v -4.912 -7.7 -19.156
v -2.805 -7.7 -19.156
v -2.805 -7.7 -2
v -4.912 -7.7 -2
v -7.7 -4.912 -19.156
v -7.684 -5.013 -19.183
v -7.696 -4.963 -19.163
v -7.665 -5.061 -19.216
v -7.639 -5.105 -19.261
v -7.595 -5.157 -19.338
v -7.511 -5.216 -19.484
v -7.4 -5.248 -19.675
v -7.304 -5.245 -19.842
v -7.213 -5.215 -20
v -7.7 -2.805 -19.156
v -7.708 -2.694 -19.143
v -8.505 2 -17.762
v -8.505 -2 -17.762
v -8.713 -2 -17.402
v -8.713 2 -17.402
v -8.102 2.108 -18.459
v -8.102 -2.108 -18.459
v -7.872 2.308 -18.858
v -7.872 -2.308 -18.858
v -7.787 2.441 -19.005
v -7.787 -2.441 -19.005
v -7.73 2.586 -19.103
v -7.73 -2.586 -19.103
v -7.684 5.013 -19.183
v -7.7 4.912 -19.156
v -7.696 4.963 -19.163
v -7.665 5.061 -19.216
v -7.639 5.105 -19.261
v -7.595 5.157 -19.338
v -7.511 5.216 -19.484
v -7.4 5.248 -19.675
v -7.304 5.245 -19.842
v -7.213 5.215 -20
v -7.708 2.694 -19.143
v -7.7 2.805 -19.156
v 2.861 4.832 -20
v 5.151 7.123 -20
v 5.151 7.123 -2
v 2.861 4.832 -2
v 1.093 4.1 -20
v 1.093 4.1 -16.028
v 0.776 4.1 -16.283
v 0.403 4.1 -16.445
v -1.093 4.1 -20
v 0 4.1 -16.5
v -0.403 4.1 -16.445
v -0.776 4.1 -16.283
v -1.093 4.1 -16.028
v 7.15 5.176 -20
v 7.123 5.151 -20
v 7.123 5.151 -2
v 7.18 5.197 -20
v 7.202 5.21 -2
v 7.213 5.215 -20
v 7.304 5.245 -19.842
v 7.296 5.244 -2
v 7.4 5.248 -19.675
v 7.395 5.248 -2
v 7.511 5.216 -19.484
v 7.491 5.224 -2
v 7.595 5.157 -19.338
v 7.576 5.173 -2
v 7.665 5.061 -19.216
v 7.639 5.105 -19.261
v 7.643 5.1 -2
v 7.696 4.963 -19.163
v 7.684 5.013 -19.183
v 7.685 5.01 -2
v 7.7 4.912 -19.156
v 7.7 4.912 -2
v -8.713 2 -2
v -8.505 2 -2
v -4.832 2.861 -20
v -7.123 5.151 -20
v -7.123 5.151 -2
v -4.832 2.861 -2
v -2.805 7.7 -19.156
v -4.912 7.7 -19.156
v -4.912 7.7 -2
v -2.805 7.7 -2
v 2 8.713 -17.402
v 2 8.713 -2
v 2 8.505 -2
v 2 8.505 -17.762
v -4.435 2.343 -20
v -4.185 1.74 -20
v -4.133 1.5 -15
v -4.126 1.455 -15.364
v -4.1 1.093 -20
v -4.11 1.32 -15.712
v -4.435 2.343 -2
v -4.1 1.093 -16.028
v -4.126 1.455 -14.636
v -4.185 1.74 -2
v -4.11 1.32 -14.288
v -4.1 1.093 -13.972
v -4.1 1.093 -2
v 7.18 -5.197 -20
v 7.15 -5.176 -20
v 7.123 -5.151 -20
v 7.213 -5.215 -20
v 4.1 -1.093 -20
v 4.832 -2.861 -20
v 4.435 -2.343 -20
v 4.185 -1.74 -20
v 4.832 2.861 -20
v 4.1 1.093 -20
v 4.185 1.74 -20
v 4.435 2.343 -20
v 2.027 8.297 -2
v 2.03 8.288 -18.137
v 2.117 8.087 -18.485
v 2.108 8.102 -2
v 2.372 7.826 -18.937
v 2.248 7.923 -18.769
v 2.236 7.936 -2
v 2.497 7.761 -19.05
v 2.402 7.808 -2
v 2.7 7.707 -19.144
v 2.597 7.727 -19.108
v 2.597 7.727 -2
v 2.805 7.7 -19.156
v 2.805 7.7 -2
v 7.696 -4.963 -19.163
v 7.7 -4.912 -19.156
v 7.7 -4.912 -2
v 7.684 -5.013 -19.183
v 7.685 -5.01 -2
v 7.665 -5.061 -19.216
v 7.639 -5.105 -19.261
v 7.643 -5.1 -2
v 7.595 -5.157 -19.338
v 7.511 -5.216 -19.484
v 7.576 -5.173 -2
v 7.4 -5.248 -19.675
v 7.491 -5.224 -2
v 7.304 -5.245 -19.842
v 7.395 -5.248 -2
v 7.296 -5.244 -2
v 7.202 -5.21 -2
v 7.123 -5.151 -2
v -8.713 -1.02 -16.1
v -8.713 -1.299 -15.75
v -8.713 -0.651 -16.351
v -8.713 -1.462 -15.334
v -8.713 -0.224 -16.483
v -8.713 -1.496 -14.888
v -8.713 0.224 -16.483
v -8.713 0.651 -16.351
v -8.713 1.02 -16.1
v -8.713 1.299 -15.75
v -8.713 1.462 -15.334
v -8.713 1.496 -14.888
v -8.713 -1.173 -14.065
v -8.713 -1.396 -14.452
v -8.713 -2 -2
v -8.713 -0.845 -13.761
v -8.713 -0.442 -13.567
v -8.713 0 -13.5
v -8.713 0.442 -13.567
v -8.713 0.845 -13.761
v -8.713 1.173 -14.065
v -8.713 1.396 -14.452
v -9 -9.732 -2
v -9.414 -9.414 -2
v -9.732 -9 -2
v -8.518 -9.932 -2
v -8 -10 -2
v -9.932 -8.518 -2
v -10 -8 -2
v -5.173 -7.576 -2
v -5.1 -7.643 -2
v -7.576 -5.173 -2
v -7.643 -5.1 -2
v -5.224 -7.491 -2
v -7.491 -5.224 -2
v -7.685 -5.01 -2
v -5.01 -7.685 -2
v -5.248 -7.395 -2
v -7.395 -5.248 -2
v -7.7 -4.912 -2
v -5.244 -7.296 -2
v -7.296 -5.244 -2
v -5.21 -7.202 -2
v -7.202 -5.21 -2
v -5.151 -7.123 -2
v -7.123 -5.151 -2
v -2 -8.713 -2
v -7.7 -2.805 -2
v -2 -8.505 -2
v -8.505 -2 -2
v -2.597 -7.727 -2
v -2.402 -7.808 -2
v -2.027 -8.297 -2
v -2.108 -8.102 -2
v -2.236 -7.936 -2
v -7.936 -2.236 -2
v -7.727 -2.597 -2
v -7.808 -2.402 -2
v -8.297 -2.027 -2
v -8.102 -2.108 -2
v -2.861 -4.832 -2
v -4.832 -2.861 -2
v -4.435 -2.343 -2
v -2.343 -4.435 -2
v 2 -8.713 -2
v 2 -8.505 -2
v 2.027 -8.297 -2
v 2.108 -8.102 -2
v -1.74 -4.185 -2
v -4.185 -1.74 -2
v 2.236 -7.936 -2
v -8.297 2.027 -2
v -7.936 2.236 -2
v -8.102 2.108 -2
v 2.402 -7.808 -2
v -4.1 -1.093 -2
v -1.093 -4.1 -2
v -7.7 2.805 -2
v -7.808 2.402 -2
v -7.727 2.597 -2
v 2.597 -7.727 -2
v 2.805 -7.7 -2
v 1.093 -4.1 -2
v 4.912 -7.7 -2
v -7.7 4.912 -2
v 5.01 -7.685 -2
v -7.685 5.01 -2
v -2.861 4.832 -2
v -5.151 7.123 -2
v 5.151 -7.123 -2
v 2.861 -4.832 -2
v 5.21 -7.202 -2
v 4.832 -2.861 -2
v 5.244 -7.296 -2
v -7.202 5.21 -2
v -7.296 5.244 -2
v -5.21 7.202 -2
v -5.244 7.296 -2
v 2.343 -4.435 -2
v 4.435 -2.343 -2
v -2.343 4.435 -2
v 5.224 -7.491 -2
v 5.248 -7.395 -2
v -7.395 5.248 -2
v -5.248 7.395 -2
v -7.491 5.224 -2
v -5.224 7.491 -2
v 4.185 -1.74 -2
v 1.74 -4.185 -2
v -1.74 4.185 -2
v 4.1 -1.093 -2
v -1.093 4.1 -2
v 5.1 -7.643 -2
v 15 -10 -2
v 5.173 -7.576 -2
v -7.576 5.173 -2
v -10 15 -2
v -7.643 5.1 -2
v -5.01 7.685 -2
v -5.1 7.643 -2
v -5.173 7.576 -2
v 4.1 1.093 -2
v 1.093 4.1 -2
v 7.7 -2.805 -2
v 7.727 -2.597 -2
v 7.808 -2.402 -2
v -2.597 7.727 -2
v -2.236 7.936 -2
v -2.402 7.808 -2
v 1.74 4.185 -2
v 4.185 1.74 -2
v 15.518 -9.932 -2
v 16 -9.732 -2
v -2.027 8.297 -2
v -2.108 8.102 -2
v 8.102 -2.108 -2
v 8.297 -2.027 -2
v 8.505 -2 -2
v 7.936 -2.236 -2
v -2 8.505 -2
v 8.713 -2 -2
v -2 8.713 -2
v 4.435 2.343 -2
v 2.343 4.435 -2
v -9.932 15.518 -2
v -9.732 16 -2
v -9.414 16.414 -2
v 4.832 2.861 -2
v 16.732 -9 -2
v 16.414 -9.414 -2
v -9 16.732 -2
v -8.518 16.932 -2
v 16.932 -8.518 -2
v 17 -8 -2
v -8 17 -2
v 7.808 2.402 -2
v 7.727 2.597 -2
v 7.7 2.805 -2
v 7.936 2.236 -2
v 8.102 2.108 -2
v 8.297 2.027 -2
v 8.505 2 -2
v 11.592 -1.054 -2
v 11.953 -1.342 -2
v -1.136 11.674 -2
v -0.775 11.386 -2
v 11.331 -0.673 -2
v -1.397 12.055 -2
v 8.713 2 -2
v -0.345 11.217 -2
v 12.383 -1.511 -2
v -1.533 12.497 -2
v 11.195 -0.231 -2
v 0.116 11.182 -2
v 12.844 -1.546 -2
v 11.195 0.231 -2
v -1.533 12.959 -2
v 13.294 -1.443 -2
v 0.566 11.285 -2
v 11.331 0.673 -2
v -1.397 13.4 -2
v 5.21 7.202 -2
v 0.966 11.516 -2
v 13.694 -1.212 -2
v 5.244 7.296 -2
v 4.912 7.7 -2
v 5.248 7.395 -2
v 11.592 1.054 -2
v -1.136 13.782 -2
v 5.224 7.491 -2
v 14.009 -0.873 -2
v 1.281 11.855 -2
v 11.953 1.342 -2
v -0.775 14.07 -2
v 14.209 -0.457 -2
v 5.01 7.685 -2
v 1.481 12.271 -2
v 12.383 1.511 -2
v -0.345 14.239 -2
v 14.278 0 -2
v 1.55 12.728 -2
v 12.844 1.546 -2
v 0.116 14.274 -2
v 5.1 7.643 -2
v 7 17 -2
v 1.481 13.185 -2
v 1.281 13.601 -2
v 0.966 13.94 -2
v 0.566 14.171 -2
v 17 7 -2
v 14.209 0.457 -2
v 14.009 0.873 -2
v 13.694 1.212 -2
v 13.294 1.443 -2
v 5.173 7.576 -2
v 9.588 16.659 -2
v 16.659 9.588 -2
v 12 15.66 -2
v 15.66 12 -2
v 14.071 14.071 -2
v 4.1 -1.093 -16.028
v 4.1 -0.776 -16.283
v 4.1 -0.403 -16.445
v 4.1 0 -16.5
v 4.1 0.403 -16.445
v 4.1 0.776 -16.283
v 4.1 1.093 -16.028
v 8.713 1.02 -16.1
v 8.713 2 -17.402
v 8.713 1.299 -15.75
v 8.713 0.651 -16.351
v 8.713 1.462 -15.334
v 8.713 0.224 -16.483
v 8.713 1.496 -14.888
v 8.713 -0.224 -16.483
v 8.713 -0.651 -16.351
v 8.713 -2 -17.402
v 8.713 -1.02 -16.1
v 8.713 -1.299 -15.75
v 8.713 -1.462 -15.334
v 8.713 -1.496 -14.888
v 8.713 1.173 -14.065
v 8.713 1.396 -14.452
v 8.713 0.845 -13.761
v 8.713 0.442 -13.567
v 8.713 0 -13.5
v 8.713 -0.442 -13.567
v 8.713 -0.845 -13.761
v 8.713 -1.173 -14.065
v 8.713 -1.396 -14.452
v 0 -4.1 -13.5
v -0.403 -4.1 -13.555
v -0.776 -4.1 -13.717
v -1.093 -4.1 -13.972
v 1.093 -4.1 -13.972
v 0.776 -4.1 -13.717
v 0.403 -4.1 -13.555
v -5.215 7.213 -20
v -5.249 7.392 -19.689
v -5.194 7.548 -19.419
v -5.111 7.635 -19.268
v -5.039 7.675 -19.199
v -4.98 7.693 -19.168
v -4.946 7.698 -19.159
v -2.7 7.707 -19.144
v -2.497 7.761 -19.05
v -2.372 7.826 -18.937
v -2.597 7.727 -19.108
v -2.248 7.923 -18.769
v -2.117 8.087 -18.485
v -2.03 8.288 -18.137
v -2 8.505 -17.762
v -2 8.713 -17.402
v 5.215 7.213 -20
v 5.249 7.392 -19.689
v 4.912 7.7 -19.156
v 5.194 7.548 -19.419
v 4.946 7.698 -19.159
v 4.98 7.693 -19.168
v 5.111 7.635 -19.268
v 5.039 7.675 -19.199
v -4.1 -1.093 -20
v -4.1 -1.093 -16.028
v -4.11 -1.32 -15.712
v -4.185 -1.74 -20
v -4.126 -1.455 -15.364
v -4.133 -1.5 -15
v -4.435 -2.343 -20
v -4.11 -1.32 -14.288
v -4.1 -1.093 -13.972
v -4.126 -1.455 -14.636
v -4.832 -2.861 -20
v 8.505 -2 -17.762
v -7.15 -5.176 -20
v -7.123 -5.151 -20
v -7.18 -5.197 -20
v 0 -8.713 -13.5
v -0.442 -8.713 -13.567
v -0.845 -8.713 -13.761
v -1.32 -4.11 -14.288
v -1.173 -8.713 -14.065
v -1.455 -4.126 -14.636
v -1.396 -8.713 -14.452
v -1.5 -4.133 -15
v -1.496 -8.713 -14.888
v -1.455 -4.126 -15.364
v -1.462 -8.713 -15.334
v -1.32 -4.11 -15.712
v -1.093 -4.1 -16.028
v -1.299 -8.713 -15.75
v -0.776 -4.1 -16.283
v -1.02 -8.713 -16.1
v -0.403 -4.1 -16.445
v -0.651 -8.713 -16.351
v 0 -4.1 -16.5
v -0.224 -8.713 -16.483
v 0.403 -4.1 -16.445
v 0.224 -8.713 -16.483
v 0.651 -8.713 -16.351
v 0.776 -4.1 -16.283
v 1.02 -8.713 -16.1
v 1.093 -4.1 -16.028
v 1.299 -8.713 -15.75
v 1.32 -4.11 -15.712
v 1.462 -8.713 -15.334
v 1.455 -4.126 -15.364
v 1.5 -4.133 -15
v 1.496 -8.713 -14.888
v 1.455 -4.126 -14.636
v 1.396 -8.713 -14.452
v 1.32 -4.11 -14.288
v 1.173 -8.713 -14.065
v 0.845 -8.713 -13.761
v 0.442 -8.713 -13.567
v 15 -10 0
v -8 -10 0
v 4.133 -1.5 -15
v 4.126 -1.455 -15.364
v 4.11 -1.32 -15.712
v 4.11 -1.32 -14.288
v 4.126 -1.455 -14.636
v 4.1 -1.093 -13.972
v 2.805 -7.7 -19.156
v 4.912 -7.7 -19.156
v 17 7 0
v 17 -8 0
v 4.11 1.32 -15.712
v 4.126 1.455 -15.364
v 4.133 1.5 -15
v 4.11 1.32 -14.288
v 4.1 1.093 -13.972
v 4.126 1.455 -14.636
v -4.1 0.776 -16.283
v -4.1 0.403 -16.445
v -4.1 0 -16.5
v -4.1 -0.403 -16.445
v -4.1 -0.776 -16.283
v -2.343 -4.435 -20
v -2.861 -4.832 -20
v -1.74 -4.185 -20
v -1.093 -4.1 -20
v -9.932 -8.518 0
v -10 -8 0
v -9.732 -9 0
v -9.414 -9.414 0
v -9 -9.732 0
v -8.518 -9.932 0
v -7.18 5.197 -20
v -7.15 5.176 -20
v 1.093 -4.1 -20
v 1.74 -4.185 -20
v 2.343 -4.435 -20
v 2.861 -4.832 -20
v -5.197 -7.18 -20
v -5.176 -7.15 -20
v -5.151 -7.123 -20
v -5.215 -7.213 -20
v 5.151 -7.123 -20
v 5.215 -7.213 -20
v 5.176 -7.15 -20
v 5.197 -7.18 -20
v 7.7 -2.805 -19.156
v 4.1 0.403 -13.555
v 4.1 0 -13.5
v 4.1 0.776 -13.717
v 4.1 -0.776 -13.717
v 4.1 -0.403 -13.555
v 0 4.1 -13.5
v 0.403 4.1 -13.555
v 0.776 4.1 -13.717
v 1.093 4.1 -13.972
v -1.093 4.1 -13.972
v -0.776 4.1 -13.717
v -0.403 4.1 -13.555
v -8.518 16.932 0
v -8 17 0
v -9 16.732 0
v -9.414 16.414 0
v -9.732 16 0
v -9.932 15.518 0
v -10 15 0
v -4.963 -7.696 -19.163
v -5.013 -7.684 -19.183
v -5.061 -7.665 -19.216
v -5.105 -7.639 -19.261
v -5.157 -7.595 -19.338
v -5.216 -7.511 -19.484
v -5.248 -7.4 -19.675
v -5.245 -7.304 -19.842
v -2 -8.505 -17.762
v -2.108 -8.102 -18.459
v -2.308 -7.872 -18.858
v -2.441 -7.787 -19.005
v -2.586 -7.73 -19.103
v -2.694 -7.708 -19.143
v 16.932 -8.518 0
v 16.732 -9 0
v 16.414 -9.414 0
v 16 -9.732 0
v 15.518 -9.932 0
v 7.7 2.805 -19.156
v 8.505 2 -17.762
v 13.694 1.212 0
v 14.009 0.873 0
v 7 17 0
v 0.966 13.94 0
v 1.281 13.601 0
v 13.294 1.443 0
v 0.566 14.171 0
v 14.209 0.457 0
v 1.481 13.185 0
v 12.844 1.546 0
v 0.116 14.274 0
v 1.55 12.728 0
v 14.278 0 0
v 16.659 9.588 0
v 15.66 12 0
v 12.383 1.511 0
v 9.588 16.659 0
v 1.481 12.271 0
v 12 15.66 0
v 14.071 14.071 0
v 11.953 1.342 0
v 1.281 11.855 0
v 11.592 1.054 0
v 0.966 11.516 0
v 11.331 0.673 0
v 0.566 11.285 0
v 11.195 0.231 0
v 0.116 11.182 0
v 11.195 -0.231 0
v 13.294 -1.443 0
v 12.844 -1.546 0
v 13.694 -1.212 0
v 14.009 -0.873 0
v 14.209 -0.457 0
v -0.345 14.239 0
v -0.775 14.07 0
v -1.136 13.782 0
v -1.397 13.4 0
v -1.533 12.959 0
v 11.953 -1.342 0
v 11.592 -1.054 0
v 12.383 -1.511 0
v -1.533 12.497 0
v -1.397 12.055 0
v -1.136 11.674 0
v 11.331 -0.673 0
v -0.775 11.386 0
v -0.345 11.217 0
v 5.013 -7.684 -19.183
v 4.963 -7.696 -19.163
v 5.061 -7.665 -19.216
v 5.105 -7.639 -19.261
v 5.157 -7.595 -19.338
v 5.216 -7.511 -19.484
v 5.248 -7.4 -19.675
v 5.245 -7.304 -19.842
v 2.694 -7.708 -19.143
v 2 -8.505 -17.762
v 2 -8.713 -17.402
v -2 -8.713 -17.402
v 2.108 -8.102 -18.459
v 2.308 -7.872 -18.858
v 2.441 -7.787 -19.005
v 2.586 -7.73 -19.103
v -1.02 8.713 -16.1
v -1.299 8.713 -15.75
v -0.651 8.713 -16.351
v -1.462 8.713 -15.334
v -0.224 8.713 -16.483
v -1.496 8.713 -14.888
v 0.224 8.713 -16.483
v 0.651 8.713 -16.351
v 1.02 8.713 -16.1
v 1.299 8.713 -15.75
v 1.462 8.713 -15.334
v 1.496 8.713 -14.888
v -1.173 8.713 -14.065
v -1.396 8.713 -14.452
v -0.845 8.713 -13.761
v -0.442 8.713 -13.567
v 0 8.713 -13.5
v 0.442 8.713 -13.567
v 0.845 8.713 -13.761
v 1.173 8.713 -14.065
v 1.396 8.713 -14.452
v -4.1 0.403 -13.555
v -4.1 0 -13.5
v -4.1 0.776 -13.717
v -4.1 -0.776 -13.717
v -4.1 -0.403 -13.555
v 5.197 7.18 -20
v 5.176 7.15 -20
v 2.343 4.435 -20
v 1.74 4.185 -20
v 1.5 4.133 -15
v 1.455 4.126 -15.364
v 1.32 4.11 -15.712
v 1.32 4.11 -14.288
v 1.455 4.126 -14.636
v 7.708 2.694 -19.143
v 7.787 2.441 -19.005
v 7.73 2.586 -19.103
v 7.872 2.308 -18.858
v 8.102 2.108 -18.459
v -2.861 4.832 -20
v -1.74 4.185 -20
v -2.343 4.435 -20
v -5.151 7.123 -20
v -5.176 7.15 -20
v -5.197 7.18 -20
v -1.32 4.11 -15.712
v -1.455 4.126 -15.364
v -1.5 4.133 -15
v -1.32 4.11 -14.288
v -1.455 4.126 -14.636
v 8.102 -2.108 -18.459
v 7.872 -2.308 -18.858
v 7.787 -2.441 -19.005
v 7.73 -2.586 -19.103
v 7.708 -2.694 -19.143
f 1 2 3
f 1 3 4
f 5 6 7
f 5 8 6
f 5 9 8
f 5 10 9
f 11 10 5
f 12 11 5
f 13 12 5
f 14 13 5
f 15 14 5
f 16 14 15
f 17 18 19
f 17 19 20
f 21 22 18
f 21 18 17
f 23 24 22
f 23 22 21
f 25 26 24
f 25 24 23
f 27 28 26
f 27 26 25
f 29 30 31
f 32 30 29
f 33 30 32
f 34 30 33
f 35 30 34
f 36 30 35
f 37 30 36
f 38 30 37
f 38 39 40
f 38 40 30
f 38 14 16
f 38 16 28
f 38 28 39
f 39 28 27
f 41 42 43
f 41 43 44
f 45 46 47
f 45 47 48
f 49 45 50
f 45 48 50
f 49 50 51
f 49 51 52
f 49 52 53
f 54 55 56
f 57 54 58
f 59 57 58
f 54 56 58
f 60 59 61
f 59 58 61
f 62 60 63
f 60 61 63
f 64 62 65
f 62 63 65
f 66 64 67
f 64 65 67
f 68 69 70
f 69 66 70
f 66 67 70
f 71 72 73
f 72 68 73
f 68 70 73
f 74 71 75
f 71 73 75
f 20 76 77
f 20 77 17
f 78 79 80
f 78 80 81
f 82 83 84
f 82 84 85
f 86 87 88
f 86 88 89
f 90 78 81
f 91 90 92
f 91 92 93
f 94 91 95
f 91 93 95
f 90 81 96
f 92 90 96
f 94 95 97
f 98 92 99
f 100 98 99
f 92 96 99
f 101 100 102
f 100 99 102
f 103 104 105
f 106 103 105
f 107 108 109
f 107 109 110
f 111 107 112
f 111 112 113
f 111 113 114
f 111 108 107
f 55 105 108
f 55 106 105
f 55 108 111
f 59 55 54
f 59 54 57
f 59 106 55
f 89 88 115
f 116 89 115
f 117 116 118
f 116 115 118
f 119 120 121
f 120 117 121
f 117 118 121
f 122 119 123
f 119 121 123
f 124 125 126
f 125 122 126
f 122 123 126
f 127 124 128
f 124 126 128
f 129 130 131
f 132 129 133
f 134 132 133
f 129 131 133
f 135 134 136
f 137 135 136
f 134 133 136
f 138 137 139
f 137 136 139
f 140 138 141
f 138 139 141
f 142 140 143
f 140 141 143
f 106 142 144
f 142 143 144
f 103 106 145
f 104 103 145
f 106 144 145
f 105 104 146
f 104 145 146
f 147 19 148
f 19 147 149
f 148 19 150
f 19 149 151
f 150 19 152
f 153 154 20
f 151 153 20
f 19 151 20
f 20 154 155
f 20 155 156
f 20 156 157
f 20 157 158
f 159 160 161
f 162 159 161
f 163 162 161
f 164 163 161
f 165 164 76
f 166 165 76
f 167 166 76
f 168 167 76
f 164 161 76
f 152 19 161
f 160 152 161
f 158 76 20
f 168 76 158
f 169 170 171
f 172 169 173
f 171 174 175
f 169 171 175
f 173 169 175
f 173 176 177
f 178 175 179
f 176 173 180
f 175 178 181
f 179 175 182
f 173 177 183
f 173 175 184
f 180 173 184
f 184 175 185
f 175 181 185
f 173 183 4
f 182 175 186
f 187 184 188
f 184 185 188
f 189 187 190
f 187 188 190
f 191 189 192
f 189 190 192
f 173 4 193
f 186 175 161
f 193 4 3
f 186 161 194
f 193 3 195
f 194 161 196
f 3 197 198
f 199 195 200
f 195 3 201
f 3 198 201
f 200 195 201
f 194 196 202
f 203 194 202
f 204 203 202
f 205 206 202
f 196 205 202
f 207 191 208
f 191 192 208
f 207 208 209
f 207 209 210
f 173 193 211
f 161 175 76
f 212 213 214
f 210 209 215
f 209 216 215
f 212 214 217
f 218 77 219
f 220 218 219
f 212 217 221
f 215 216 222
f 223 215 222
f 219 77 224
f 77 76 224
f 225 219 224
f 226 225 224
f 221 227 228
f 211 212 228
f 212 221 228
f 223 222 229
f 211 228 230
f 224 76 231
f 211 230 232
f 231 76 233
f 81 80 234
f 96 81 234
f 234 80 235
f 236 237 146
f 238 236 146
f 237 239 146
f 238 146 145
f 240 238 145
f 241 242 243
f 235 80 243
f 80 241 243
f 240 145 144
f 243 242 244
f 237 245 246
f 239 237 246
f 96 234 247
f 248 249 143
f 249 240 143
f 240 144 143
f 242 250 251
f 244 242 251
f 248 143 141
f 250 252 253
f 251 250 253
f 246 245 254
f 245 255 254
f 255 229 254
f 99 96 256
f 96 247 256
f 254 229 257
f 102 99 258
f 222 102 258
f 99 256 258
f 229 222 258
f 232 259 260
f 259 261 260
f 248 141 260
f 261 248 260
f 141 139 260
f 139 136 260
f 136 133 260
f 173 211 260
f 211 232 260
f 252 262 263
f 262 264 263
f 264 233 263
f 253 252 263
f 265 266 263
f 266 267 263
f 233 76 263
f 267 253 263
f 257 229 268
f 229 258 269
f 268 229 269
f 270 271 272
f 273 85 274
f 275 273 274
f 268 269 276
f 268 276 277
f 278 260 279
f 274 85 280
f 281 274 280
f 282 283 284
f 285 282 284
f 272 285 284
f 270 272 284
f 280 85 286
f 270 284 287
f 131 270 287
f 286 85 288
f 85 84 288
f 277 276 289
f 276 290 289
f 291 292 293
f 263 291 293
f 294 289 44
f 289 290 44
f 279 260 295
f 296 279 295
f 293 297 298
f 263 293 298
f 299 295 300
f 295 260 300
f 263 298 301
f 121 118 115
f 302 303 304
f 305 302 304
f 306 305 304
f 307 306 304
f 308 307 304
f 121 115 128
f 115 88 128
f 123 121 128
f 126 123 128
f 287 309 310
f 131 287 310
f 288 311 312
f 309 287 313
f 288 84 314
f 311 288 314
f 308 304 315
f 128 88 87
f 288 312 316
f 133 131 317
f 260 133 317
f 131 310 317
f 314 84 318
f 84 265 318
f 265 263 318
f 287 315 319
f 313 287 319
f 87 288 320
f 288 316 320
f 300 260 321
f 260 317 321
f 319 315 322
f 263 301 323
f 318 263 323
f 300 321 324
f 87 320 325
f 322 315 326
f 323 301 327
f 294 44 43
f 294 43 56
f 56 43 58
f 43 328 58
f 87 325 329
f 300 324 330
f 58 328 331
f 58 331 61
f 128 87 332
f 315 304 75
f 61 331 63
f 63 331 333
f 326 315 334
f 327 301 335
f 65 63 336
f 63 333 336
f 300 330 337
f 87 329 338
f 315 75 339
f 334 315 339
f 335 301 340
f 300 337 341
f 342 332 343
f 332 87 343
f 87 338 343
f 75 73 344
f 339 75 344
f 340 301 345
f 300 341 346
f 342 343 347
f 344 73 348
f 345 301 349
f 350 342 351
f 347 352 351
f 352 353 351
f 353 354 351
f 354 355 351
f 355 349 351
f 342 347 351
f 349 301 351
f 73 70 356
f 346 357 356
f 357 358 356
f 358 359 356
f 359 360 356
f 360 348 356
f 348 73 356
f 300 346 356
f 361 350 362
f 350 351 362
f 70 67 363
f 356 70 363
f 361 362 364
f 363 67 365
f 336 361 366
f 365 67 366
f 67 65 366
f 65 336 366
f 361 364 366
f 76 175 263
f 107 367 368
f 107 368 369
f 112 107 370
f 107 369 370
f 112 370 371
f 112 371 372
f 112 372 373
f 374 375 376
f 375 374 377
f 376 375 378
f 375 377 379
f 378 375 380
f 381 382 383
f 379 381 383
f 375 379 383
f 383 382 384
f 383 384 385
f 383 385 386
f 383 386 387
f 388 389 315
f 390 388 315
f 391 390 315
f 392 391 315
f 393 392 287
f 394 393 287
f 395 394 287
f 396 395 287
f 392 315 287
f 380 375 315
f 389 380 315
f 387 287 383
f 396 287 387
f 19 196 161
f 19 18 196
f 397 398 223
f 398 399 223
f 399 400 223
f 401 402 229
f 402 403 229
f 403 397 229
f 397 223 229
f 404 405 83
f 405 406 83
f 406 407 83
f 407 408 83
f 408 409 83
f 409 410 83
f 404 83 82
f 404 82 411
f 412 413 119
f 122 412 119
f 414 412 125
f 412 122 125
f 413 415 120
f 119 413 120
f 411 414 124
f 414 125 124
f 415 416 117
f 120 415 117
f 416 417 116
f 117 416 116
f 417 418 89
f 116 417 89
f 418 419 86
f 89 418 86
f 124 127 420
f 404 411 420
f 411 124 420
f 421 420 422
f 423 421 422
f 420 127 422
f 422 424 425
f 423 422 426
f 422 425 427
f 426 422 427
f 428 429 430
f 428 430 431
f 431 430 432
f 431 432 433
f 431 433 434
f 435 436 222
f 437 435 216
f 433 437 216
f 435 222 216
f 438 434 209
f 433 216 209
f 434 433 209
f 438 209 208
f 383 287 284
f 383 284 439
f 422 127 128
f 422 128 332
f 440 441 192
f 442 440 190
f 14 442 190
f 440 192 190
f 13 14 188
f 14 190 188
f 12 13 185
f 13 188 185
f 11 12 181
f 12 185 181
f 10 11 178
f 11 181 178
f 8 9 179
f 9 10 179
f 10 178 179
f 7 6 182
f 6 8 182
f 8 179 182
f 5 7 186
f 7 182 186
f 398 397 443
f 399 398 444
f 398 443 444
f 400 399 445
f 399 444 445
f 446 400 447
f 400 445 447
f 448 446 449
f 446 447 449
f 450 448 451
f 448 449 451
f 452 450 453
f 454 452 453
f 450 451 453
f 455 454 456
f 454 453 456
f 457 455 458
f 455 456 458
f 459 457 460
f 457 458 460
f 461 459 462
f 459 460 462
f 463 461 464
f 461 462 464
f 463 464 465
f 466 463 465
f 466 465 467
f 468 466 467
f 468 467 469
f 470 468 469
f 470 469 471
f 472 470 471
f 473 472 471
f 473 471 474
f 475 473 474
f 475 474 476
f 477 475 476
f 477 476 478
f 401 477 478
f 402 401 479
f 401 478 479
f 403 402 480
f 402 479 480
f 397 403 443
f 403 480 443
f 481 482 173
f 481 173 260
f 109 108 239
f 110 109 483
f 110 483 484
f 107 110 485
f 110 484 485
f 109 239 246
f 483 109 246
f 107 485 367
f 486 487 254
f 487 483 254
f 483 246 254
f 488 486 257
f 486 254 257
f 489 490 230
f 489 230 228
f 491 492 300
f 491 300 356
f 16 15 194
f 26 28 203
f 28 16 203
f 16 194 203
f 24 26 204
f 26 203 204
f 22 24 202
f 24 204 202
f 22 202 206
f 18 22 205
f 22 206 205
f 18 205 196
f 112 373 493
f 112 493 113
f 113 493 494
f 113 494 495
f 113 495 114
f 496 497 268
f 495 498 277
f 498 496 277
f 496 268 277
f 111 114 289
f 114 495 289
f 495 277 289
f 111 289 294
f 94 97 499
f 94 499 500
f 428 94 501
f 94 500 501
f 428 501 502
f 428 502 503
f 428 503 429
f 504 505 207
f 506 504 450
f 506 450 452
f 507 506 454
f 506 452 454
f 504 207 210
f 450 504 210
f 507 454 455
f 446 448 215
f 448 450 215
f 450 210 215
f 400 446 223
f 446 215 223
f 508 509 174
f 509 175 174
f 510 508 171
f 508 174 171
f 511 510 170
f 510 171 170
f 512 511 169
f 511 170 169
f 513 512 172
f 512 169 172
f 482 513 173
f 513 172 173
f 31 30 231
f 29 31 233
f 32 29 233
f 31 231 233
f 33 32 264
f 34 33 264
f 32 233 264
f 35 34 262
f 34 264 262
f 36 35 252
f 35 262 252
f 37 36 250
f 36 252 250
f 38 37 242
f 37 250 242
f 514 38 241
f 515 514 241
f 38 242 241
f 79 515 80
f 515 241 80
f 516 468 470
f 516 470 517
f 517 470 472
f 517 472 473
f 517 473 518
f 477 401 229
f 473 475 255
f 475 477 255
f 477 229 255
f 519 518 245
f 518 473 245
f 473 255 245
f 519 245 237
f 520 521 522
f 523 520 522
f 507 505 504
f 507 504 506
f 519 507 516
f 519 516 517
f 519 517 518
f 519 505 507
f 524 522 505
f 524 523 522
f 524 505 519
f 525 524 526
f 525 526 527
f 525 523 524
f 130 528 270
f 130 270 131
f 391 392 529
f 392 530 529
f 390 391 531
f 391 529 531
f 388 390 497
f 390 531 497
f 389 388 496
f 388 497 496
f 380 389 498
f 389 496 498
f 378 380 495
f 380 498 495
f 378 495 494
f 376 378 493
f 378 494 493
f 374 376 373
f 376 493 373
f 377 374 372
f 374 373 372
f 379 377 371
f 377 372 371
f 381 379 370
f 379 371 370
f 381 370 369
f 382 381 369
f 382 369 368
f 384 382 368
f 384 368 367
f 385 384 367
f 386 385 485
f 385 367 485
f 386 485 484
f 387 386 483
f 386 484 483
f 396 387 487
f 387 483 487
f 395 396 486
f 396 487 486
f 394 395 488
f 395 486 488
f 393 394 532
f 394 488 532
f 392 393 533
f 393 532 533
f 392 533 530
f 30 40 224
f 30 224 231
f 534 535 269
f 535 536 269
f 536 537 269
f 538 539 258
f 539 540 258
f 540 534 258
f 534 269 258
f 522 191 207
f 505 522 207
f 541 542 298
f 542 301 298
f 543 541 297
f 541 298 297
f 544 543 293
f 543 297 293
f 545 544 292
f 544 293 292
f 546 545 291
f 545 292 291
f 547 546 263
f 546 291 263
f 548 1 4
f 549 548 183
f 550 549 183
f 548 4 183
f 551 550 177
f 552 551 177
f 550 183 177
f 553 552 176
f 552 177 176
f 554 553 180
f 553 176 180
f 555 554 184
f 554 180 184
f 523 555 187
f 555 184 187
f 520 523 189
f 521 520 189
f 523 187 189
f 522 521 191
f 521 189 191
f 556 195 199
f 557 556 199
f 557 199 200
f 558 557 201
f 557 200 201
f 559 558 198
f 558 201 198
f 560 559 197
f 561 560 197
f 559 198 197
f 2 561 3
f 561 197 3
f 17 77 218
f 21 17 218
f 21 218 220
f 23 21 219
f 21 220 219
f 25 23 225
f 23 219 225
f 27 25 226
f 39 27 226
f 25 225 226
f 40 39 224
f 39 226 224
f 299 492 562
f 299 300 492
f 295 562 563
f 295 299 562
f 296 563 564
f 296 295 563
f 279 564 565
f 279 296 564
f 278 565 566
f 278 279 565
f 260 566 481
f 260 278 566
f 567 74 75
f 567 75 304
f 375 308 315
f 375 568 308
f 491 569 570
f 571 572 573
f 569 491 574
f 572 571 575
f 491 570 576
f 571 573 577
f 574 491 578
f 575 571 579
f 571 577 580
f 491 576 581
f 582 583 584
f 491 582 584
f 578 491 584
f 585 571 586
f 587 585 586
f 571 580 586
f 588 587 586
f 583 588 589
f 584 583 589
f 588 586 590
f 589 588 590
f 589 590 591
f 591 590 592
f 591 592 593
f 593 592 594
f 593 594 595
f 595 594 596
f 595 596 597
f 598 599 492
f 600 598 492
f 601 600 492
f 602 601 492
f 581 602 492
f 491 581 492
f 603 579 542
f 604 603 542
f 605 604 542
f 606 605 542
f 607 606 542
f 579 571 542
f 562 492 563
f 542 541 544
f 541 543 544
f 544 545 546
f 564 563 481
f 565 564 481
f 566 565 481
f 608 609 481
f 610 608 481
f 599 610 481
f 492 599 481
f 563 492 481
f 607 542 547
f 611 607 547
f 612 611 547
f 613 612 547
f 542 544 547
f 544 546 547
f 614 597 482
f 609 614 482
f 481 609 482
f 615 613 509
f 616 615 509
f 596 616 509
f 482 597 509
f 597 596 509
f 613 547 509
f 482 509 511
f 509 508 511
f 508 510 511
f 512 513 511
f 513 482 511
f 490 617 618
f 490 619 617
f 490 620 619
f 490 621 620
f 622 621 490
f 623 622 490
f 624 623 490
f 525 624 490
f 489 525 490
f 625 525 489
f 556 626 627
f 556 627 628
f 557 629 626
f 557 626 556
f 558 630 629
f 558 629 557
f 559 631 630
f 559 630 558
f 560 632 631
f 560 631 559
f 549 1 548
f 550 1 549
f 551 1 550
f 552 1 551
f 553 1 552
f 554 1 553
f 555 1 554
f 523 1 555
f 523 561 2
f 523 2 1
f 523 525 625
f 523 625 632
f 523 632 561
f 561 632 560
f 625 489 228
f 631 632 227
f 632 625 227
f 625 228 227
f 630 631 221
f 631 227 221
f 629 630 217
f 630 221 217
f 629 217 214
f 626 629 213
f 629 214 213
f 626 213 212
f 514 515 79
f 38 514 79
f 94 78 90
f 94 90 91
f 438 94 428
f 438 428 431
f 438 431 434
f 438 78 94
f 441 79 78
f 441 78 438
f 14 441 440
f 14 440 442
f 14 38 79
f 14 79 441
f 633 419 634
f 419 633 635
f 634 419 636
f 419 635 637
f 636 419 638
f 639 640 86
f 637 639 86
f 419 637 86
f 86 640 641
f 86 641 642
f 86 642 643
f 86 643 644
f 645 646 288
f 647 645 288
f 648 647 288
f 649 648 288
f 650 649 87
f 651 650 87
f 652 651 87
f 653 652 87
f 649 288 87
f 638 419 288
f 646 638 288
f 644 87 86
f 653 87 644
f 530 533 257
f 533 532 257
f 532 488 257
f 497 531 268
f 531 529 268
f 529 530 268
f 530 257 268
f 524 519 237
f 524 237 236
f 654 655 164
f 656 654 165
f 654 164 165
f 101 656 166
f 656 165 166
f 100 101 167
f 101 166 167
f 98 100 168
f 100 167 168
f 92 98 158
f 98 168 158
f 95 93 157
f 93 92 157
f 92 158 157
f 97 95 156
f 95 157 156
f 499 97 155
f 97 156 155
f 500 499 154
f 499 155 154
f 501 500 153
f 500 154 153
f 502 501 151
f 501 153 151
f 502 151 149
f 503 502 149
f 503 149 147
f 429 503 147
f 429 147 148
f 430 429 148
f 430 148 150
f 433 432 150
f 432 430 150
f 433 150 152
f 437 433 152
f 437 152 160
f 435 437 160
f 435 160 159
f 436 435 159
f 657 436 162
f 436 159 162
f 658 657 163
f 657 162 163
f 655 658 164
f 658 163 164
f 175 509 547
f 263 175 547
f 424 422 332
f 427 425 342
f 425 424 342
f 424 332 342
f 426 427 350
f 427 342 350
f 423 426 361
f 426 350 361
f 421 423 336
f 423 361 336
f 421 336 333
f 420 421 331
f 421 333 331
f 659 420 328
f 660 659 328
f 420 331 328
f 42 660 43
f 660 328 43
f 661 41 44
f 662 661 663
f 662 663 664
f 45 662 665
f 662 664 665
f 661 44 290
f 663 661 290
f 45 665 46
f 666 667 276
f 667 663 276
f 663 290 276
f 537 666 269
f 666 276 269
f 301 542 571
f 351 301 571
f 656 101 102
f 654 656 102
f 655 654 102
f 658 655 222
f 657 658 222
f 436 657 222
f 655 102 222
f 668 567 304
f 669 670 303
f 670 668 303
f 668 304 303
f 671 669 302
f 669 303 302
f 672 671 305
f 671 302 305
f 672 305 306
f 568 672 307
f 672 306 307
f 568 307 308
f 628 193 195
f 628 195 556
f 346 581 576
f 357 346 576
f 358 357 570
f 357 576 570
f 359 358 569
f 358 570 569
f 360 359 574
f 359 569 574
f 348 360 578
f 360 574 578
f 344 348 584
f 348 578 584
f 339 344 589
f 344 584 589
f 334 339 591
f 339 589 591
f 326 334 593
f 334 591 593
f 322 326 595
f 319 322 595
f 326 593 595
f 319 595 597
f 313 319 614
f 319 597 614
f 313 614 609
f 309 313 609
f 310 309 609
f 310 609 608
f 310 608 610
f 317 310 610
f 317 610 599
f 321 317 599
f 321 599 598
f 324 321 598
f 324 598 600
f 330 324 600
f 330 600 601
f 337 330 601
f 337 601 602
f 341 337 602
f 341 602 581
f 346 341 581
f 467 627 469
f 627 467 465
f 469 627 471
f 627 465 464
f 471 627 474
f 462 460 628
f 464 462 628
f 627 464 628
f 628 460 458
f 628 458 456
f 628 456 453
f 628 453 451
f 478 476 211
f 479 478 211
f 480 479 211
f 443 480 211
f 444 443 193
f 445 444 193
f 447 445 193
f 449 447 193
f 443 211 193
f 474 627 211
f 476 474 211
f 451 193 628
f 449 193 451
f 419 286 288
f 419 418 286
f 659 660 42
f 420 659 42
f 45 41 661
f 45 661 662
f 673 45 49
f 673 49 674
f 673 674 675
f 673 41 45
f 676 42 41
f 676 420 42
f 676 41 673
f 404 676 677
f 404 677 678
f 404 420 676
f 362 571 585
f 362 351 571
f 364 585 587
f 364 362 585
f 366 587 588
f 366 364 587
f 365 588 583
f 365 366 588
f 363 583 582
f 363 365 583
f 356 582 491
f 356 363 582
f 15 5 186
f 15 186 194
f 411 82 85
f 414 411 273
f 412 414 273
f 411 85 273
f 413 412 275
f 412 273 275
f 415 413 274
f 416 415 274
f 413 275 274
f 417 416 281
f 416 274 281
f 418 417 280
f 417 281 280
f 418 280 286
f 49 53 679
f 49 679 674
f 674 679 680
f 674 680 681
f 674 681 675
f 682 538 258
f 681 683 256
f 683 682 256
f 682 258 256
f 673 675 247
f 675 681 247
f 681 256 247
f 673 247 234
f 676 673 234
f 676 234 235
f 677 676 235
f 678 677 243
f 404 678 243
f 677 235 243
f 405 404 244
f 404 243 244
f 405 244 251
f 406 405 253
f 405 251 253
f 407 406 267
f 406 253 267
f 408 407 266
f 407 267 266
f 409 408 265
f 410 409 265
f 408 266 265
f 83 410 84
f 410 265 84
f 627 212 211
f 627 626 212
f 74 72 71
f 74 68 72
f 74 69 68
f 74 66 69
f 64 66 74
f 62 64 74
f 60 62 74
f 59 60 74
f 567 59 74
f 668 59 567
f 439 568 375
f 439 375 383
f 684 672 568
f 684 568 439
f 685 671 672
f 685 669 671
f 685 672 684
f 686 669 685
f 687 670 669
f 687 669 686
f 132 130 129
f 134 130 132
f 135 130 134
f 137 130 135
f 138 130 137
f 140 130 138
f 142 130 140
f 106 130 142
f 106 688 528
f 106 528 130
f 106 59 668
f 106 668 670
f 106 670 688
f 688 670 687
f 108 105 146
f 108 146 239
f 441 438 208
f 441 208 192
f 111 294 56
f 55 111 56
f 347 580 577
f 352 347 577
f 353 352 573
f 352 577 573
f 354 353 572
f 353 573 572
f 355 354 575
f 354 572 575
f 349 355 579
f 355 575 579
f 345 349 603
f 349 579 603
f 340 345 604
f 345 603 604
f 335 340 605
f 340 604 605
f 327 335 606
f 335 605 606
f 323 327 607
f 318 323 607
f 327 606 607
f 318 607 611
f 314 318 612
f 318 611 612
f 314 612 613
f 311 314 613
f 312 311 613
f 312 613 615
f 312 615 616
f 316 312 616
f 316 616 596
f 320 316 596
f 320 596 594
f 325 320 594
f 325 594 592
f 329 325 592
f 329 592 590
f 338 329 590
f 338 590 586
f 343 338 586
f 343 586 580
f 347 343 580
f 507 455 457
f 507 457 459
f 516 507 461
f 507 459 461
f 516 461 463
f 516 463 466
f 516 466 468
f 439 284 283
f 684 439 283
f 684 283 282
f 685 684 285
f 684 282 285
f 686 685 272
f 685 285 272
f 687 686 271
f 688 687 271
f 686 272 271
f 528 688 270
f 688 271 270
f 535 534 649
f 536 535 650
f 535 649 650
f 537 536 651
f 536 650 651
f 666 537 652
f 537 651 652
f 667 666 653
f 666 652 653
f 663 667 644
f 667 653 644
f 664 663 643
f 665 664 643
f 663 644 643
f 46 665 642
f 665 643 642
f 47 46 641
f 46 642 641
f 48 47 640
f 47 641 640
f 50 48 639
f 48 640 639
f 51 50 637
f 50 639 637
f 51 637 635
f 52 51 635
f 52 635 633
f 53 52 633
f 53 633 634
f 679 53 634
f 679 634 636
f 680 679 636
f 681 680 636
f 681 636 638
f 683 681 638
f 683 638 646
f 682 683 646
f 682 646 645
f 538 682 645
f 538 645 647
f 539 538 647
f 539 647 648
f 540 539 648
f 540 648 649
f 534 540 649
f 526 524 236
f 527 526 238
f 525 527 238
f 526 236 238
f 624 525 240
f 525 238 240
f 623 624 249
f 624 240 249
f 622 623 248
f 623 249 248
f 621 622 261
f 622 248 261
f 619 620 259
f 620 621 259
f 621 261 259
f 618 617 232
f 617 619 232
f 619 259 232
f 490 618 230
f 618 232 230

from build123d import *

# Parameters (mm, degrees)
BOSS_EXTRUDE2_DEPTH           = 20
CHAMFER2_SIZE                 = 1.5
CHAMFER2_SIZE2                = 2.598076211
SKETCH4_R                     = 1.5
CUT_EXTRUDE1_DEPTH            = 22.185810788
SKETCH6_W                     = 27
SKETCH6_H                     = 27
BOSS_EXTRUDE4_DEPTH           = 2
CIRPATTERN1_COUNT             = 4
CHAMFER2_OF_CIRPATTERN1_SIZE2 = 1.5
CHAMFER2_OF_CIRPATTERN1_SIZE  = 2.598076211
SKETCH10_R                    = 1.55
CUT_EXTRUDE3_DEPTH            = 32.272991606
FILLET1_R                     = 10
FILLET2_R                     = 2


with BuildPart() as part:
    # Sketch2 → Boss-Extrude2 (new body)
    with BuildSketch(Plane.XY):
        with BuildLine():
            Line((-2.860520074, 4.832233047), (-5.150943513, 7.122656487))
            ThreePointArc((-5.150943513, 7.122656487), (-5.224256058, 7.491223537), (-4.9118, 7.7))
            Line((-4.9118, 7.7), (-2.8048, 7.7))
            ThreePointArc((-2.8048, 7.7), (-2.235720463, 7.935720463), (-2, 8.5048))
            Line((-2, 8.5048), (-2, 8.7126))
            Line((-2, 8.7126), (2, 8.7126))
            Line((2, 8.7126), (2, 8.5048))
            ThreePointArc((2, 8.5048), (2.235720463, 7.935720463), (2.8048, 7.7))
            Line((2.8048, 7.7), (4.9118, 7.7))
            ThreePointArc((4.9118, 7.7), (5.224256058, 7.491223537), (5.150943513, 7.122656487))
            Line((5.150943513, 7.122656487), (2.860520074, 4.832233047))
            ThreePointArc((2.860520074, 4.832233047), (2.049461702, 4.290301169), (1.092753121, 4.1))
            Line((1.092753121, 4.1), (-1.092753121, 4.1))
            ThreePointArc((-1.092753121, 4.1), (-2.049461702, 4.290301169), (-2.860520074, 4.832233047))
        make_face()
    boss_extrude2 = extrude(amount=-BOSS_EXTRUDE2_DEPTH)

    # Chamfer2
    chamfer2_edges = [part.edges().sort_by_distance(p)[0] for p in [
        (0, 8.7126, -20),
    ]]
    chamfer2_side = [part.faces().sort_by_distance(p)[0] for p in [
        (0, 6.450366022, -20),
    ]]
    chamfer(chamfer2_edges, length=CHAMFER2_SIZE, length2=CHAMFER2_SIZE2, reference=chamfer2_side[0])

    # Sketch4 → Cut-Extrude1 (cut, through all)
    with BuildSketch(Plane(origin=(0, 8.7126, 0), x_dir=(1, 0, 0), z_dir=(0, 1, 0))):
        with Locations(Location((0, 15, 0), (0, 0, 270))):
            Circle(SKETCH4_R)
    cut_extrude1 = extrude(amount=-CUT_EXTRUDE1_DEPTH, mode=Mode.SUBTRACT)

    # Sketch6 → Boss-Extrude4 (add)
    with BuildSketch(Plane.XY):
        with Locations((3.5, 3.5)):
            Rectangle(SKETCH6_W, SKETCH6_H)
    extrude(amount=-BOSS_EXTRUDE4_DEPTH)

    # CirPattern1: Boss-Extrude2, Cut-Extrude1 ×4 about axis
    cirpattern1_axis = Axis((0, 0, 0), (0, 0, 1))
    add([boss_extrude2.rotate(cirpattern1_axis, i * 360 / CIRPATTERN1_COUNT) for i in range(1, CIRPATTERN1_COUNT)])
    add([cut_extrude1.rotate(cirpattern1_axis, i * 360 / CIRPATTERN1_COUNT) for i in range(1, CIRPATTERN1_COUNT)], mode=Mode.SUBTRACT)

    # Chamfer2 of CirPattern1
    chamfer2_of_cirpattern1_edges = [part.edges().sort_by_distance(p)[0] for p in [
        (-8.7126, 0, -20),
        (0, -8.7126, -20),
        (8.7126, 0, -20),
    ]]
    chamfer(chamfer2_of_cirpattern1_edges, length=CHAMFER2_OF_CIRPATTERN1_SIZE, length2=CHAMFER2_OF_CIRPATTERN1_SIZE2)

    # Sketch10 → Cut-Extrude3 (cut, through all)
    with BuildSketch(Plane.XY):
        with Locations((0, 12.727922061)):
            Circle(SKETCH10_R)
        with Locations((12.727922061, 0)):
            Circle(SKETCH10_R)
    extrude(amount=-CUT_EXTRUDE3_DEPTH, mode=Mode.SUBTRACT)

    # Fillet1
    fillet1_edges = [part.edges().sort_by_distance(p)[0] for p in [
        (17, 17, -1),
    ]]
    fillet(fillet1_edges, radius=FILLET1_R)

    # Fillet2
    fillet2_edges = [part.edges().sort_by_distance(p)[0] for p in [
        (-10, -10, -1),
        (-10, 17, -1),
        (17, -10, -1),
    ]]
    fillet(fillet2_edges, radius=FILLET2_R)


solid = part.part
